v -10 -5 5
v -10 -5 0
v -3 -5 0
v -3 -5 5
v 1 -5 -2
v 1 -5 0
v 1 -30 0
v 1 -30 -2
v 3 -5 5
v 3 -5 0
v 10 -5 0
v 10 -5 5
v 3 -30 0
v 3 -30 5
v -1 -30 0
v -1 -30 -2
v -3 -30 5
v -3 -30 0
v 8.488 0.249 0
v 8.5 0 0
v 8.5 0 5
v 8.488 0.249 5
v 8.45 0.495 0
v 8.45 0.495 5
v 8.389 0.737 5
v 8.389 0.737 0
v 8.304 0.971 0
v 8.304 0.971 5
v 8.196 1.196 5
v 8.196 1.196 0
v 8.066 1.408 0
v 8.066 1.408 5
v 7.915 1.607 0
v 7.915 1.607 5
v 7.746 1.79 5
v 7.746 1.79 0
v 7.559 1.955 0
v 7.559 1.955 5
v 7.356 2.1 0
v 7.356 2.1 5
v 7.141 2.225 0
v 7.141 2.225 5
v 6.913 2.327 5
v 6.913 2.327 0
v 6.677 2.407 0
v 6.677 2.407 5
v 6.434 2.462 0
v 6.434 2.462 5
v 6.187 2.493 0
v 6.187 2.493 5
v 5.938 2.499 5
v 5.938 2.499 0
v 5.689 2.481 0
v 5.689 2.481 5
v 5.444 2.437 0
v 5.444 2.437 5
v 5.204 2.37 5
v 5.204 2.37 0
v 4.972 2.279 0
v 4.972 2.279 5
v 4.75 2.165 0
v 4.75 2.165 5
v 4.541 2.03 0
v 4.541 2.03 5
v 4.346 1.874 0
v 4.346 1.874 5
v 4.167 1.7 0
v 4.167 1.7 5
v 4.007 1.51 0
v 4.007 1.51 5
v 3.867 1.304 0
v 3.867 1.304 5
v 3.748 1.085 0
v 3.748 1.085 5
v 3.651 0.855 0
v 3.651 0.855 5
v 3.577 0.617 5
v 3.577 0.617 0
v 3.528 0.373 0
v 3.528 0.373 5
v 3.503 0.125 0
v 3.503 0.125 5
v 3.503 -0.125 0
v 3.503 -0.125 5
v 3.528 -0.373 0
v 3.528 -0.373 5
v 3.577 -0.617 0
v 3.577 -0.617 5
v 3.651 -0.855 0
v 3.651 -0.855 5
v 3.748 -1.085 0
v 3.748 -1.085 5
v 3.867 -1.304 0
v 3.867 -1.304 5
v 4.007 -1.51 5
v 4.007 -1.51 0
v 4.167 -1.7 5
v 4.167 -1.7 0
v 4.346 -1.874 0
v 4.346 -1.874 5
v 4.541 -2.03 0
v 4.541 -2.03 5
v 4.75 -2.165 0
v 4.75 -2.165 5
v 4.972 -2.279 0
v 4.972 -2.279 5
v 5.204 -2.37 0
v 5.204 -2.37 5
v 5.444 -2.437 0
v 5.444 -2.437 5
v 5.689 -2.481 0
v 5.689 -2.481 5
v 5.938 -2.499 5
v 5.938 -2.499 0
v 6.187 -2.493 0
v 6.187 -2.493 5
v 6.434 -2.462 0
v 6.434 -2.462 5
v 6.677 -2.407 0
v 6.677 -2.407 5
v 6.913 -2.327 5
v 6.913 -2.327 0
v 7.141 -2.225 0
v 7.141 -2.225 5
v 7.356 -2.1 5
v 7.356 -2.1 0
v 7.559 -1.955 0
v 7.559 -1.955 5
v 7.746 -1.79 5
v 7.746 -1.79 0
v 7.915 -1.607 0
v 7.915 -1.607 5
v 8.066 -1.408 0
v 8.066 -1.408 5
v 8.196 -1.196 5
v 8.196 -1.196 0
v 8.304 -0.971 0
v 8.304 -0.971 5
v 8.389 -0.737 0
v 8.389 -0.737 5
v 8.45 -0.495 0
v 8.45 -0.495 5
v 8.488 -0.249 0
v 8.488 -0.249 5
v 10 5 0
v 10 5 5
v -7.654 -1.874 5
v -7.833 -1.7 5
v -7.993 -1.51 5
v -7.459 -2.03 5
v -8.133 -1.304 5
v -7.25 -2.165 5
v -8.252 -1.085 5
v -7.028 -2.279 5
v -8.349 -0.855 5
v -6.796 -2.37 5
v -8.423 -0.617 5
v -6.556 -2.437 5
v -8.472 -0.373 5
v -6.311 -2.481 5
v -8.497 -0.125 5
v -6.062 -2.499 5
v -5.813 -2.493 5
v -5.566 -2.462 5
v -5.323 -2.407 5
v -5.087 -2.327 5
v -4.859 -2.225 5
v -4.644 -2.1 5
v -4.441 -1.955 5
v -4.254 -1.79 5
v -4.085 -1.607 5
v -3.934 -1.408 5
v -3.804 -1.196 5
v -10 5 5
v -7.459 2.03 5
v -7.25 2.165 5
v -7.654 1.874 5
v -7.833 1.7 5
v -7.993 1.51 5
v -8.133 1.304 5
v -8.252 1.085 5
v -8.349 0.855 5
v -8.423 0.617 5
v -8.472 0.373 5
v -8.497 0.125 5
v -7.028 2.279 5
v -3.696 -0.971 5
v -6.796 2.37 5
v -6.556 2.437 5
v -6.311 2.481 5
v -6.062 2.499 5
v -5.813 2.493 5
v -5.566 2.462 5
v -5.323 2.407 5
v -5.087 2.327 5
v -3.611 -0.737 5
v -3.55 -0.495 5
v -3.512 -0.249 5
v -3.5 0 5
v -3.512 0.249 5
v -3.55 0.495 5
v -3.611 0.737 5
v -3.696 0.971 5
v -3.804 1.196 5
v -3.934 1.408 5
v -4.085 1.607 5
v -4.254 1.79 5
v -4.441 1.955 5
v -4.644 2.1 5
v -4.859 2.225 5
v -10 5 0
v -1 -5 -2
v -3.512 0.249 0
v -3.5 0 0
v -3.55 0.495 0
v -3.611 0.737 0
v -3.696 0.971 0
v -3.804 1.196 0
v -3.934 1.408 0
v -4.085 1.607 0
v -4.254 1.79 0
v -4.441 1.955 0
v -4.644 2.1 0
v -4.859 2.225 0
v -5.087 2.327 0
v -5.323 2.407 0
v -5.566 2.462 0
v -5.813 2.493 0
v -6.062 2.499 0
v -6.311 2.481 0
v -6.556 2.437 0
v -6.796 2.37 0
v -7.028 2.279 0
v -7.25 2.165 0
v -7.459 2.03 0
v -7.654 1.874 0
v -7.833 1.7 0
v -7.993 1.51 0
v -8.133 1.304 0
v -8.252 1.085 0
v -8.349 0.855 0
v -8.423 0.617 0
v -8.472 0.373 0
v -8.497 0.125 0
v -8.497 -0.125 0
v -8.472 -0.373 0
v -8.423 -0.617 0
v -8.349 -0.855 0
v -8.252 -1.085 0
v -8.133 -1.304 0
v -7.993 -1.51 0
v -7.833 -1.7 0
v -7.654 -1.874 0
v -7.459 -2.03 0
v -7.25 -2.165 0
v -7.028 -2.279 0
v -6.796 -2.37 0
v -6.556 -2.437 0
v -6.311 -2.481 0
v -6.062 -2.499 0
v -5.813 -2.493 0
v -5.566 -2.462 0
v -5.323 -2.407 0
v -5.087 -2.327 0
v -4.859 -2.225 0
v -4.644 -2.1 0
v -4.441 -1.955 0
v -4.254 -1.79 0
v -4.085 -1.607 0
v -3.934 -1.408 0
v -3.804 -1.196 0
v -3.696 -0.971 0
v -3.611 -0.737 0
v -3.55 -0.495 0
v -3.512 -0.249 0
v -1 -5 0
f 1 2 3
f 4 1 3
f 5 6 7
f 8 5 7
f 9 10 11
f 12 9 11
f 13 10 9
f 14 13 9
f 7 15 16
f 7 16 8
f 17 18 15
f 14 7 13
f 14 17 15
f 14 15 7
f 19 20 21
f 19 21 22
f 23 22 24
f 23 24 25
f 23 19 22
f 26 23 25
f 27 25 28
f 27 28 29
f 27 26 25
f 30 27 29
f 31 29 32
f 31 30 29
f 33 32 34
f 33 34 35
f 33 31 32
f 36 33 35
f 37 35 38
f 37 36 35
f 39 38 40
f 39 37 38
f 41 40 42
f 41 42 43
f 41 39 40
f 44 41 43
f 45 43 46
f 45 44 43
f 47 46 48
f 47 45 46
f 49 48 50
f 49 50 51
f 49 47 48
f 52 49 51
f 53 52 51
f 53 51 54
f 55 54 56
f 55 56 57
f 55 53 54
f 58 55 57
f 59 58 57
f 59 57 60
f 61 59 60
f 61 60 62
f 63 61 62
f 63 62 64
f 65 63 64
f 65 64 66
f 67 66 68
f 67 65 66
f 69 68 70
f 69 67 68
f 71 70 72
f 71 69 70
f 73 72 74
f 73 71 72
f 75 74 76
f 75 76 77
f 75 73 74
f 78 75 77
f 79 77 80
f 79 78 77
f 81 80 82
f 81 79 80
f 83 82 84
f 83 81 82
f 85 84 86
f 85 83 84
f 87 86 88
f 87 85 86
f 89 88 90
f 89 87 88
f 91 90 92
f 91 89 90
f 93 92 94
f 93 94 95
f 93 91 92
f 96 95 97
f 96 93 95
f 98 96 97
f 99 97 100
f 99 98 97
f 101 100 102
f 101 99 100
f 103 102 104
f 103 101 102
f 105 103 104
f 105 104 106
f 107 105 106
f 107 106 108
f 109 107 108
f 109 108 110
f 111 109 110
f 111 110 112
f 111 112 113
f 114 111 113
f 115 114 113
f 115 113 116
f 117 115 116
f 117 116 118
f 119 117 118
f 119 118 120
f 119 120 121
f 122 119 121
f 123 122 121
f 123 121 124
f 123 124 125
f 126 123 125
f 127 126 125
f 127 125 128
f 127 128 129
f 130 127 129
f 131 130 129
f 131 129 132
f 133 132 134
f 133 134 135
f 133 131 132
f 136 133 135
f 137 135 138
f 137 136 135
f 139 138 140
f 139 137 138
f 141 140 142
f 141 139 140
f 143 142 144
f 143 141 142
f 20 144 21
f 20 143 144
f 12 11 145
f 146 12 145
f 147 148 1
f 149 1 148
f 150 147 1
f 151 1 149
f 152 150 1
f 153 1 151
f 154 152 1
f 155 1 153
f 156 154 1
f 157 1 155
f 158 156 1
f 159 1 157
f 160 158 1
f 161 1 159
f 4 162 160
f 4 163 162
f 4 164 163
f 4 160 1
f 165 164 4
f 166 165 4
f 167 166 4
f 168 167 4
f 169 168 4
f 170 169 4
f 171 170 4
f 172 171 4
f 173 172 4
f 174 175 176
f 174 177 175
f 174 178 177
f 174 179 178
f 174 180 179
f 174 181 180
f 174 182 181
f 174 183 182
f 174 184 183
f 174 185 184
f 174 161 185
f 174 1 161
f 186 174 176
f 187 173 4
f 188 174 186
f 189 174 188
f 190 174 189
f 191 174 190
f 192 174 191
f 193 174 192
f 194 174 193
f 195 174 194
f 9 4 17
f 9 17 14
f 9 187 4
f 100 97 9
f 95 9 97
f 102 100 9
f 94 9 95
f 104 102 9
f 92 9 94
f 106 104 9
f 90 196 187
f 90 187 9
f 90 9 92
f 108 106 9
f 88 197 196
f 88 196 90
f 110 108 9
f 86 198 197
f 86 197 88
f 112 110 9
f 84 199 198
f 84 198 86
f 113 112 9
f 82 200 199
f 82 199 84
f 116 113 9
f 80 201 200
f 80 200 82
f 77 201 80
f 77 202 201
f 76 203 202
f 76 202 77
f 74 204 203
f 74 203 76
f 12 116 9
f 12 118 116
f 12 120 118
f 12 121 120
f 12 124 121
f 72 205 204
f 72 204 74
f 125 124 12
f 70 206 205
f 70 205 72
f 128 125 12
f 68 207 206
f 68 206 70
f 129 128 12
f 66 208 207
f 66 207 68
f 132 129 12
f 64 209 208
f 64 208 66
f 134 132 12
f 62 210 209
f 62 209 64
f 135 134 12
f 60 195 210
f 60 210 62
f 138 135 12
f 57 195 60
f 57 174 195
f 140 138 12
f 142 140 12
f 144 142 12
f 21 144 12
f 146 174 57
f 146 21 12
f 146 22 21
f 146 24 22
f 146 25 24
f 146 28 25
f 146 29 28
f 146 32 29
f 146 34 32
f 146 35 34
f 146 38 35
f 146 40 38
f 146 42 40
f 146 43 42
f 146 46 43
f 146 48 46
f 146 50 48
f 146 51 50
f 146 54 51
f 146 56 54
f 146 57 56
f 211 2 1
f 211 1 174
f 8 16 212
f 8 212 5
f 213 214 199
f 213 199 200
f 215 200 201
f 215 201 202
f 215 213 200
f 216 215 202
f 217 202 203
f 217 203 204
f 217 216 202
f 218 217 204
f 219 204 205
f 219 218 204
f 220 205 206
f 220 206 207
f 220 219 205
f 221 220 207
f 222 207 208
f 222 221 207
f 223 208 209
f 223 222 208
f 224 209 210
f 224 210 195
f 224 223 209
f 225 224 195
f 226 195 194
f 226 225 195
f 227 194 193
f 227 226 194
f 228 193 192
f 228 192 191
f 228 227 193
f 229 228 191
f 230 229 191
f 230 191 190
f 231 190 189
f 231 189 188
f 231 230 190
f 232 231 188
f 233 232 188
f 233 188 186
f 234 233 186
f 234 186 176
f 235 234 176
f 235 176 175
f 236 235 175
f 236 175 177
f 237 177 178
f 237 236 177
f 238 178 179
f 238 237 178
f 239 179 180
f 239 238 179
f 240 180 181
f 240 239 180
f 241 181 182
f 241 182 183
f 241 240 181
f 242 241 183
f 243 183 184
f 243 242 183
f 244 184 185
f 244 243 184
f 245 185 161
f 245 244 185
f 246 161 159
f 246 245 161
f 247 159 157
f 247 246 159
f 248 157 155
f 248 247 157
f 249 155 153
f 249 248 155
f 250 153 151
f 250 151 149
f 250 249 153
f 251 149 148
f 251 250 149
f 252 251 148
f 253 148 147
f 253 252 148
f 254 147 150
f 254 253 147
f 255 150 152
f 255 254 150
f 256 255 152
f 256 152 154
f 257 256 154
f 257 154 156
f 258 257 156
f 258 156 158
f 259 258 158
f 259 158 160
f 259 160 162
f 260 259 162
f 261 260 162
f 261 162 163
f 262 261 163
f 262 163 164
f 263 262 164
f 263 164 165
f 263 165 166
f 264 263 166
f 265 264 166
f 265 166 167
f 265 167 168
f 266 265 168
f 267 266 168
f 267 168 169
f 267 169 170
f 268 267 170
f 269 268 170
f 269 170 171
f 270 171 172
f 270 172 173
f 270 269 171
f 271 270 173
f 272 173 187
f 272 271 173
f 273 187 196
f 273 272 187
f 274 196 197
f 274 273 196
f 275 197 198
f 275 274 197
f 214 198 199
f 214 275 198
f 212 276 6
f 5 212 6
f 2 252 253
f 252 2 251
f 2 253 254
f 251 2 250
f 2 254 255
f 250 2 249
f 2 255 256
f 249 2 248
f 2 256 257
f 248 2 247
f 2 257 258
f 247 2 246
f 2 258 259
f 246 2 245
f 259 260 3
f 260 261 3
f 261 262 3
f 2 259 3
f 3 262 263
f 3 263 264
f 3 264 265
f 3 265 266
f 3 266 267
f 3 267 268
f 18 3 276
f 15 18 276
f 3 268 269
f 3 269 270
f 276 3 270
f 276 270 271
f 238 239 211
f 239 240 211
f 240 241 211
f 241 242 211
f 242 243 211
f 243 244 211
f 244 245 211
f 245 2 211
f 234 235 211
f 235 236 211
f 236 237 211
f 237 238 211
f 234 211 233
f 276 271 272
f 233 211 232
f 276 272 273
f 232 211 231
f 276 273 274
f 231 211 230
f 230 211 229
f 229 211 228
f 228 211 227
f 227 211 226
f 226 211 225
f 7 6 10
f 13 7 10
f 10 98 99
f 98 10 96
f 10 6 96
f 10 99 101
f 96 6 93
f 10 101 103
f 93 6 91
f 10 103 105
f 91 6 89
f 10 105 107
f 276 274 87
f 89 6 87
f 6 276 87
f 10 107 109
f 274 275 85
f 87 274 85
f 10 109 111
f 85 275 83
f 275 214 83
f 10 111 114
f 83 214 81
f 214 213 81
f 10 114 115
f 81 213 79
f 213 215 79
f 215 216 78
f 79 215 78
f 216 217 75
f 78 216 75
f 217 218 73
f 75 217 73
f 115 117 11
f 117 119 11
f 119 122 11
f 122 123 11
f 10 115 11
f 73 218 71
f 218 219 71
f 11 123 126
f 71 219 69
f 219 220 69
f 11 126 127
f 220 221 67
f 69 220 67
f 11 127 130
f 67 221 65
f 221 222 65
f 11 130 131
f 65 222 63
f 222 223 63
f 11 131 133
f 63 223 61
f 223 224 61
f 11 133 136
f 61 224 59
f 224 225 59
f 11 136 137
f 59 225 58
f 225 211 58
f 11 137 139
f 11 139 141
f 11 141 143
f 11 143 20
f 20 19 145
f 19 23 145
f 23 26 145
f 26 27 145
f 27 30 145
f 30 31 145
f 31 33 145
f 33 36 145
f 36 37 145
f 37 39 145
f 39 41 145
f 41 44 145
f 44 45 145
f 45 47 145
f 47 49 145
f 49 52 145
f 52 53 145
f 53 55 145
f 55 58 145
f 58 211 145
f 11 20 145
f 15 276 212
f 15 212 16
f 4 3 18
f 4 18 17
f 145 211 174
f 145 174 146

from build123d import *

# Parameters (mm, degrees)
SKETCH_W     = 20
SKETCH_H     = 10
SKETCH_R     = 2.5
PAD_DEPTH    = 5
SKETCH001_W  = 6
SKETCH001_H  = 5
PAD001_DEPTH = 25
SKETCH002_W  = 2
SKETCH002_H  = 25
PAD002_DEPTH = 2


with BuildPart() as part:
    # Sketch → Pad (new body)
    with BuildSketch(Plane.XY):
        Rectangle(SKETCH_W, SKETCH_H)
        with Locations((-6, 0)):
            Circle(SKETCH_R, mode=Mode.SUBTRACT)
        with Locations((6, 0)):
            Circle(SKETCH_R, mode=Mode.SUBTRACT)
    extrude(amount=PAD_DEPTH)

    # Sketch001 → Pad001 (new body)
    with BuildSketch(Plane.XZ.offset(5)):
        with Locations((0, 2.5)):
            Rectangle(SKETCH001_W, SKETCH001_H)
    extrude(amount=PAD001_DEPTH)

    # Sketch002 → Pad002 (new body)
    with BuildSketch(Plane(origin=(0, 0, 0), x_dir=(1, 0, 0), z_dir=(0, 0, -1))):
        with Locations((0, 17.5)):
            Rectangle(SKETCH002_W, SKETCH002_H)
    extrude(amount=PAD002_DEPTH)


solid = part.part
